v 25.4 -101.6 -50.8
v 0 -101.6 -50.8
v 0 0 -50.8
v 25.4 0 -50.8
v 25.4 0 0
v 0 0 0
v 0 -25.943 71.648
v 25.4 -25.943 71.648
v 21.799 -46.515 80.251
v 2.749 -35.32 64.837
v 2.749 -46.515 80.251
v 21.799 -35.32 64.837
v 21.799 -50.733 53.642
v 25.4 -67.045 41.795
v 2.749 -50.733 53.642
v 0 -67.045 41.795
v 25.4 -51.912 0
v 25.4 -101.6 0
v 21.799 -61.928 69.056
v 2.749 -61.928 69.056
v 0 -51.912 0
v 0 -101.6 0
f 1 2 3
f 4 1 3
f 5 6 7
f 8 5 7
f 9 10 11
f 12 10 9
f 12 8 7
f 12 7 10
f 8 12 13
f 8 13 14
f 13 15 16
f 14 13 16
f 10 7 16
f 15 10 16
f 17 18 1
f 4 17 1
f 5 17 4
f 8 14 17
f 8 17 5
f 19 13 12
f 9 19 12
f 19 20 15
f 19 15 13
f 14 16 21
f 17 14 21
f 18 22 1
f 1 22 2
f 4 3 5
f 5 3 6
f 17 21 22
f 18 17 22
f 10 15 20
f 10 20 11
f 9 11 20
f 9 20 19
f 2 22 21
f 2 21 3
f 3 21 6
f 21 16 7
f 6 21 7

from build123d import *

# Parameters (mm, degrees)
F1_DEPTH = 25.4
F2_W     = 19.05
F2_H     = 19.05
F3_DEPTH = 19.05


with BuildPart() as f1:
    # F0 (on Right) → F1 (new body)
    with BuildSketch(Plane.YZ):
        Polygon((-67.0450606095, 41.7946282453), (-51.9119330465, 0), (0, 0), (-25.9425043938, 71.6479341348), align=None)
        Polygon((-51.9119330465, 0), (-101.6, 0), (-101.6, -50.8), (0, -50.8), (0, 0), align=None)
    extrude(amount=F1_DEPTH)

    # F2 (on face) → F3 (join)
    with BuildSketch(Plane(origin=(0, -43.0264861608, 59.2396223299), x_dir=(1, 0, 0), z_dir=(0, -0.5876635018, 0.8091054373))):
        with Locations((12.2738424689, 0)):
            Rectangle(F2_W, F2_H)
    extrude(amount=F3_DEPTH)


solid = f1.part
